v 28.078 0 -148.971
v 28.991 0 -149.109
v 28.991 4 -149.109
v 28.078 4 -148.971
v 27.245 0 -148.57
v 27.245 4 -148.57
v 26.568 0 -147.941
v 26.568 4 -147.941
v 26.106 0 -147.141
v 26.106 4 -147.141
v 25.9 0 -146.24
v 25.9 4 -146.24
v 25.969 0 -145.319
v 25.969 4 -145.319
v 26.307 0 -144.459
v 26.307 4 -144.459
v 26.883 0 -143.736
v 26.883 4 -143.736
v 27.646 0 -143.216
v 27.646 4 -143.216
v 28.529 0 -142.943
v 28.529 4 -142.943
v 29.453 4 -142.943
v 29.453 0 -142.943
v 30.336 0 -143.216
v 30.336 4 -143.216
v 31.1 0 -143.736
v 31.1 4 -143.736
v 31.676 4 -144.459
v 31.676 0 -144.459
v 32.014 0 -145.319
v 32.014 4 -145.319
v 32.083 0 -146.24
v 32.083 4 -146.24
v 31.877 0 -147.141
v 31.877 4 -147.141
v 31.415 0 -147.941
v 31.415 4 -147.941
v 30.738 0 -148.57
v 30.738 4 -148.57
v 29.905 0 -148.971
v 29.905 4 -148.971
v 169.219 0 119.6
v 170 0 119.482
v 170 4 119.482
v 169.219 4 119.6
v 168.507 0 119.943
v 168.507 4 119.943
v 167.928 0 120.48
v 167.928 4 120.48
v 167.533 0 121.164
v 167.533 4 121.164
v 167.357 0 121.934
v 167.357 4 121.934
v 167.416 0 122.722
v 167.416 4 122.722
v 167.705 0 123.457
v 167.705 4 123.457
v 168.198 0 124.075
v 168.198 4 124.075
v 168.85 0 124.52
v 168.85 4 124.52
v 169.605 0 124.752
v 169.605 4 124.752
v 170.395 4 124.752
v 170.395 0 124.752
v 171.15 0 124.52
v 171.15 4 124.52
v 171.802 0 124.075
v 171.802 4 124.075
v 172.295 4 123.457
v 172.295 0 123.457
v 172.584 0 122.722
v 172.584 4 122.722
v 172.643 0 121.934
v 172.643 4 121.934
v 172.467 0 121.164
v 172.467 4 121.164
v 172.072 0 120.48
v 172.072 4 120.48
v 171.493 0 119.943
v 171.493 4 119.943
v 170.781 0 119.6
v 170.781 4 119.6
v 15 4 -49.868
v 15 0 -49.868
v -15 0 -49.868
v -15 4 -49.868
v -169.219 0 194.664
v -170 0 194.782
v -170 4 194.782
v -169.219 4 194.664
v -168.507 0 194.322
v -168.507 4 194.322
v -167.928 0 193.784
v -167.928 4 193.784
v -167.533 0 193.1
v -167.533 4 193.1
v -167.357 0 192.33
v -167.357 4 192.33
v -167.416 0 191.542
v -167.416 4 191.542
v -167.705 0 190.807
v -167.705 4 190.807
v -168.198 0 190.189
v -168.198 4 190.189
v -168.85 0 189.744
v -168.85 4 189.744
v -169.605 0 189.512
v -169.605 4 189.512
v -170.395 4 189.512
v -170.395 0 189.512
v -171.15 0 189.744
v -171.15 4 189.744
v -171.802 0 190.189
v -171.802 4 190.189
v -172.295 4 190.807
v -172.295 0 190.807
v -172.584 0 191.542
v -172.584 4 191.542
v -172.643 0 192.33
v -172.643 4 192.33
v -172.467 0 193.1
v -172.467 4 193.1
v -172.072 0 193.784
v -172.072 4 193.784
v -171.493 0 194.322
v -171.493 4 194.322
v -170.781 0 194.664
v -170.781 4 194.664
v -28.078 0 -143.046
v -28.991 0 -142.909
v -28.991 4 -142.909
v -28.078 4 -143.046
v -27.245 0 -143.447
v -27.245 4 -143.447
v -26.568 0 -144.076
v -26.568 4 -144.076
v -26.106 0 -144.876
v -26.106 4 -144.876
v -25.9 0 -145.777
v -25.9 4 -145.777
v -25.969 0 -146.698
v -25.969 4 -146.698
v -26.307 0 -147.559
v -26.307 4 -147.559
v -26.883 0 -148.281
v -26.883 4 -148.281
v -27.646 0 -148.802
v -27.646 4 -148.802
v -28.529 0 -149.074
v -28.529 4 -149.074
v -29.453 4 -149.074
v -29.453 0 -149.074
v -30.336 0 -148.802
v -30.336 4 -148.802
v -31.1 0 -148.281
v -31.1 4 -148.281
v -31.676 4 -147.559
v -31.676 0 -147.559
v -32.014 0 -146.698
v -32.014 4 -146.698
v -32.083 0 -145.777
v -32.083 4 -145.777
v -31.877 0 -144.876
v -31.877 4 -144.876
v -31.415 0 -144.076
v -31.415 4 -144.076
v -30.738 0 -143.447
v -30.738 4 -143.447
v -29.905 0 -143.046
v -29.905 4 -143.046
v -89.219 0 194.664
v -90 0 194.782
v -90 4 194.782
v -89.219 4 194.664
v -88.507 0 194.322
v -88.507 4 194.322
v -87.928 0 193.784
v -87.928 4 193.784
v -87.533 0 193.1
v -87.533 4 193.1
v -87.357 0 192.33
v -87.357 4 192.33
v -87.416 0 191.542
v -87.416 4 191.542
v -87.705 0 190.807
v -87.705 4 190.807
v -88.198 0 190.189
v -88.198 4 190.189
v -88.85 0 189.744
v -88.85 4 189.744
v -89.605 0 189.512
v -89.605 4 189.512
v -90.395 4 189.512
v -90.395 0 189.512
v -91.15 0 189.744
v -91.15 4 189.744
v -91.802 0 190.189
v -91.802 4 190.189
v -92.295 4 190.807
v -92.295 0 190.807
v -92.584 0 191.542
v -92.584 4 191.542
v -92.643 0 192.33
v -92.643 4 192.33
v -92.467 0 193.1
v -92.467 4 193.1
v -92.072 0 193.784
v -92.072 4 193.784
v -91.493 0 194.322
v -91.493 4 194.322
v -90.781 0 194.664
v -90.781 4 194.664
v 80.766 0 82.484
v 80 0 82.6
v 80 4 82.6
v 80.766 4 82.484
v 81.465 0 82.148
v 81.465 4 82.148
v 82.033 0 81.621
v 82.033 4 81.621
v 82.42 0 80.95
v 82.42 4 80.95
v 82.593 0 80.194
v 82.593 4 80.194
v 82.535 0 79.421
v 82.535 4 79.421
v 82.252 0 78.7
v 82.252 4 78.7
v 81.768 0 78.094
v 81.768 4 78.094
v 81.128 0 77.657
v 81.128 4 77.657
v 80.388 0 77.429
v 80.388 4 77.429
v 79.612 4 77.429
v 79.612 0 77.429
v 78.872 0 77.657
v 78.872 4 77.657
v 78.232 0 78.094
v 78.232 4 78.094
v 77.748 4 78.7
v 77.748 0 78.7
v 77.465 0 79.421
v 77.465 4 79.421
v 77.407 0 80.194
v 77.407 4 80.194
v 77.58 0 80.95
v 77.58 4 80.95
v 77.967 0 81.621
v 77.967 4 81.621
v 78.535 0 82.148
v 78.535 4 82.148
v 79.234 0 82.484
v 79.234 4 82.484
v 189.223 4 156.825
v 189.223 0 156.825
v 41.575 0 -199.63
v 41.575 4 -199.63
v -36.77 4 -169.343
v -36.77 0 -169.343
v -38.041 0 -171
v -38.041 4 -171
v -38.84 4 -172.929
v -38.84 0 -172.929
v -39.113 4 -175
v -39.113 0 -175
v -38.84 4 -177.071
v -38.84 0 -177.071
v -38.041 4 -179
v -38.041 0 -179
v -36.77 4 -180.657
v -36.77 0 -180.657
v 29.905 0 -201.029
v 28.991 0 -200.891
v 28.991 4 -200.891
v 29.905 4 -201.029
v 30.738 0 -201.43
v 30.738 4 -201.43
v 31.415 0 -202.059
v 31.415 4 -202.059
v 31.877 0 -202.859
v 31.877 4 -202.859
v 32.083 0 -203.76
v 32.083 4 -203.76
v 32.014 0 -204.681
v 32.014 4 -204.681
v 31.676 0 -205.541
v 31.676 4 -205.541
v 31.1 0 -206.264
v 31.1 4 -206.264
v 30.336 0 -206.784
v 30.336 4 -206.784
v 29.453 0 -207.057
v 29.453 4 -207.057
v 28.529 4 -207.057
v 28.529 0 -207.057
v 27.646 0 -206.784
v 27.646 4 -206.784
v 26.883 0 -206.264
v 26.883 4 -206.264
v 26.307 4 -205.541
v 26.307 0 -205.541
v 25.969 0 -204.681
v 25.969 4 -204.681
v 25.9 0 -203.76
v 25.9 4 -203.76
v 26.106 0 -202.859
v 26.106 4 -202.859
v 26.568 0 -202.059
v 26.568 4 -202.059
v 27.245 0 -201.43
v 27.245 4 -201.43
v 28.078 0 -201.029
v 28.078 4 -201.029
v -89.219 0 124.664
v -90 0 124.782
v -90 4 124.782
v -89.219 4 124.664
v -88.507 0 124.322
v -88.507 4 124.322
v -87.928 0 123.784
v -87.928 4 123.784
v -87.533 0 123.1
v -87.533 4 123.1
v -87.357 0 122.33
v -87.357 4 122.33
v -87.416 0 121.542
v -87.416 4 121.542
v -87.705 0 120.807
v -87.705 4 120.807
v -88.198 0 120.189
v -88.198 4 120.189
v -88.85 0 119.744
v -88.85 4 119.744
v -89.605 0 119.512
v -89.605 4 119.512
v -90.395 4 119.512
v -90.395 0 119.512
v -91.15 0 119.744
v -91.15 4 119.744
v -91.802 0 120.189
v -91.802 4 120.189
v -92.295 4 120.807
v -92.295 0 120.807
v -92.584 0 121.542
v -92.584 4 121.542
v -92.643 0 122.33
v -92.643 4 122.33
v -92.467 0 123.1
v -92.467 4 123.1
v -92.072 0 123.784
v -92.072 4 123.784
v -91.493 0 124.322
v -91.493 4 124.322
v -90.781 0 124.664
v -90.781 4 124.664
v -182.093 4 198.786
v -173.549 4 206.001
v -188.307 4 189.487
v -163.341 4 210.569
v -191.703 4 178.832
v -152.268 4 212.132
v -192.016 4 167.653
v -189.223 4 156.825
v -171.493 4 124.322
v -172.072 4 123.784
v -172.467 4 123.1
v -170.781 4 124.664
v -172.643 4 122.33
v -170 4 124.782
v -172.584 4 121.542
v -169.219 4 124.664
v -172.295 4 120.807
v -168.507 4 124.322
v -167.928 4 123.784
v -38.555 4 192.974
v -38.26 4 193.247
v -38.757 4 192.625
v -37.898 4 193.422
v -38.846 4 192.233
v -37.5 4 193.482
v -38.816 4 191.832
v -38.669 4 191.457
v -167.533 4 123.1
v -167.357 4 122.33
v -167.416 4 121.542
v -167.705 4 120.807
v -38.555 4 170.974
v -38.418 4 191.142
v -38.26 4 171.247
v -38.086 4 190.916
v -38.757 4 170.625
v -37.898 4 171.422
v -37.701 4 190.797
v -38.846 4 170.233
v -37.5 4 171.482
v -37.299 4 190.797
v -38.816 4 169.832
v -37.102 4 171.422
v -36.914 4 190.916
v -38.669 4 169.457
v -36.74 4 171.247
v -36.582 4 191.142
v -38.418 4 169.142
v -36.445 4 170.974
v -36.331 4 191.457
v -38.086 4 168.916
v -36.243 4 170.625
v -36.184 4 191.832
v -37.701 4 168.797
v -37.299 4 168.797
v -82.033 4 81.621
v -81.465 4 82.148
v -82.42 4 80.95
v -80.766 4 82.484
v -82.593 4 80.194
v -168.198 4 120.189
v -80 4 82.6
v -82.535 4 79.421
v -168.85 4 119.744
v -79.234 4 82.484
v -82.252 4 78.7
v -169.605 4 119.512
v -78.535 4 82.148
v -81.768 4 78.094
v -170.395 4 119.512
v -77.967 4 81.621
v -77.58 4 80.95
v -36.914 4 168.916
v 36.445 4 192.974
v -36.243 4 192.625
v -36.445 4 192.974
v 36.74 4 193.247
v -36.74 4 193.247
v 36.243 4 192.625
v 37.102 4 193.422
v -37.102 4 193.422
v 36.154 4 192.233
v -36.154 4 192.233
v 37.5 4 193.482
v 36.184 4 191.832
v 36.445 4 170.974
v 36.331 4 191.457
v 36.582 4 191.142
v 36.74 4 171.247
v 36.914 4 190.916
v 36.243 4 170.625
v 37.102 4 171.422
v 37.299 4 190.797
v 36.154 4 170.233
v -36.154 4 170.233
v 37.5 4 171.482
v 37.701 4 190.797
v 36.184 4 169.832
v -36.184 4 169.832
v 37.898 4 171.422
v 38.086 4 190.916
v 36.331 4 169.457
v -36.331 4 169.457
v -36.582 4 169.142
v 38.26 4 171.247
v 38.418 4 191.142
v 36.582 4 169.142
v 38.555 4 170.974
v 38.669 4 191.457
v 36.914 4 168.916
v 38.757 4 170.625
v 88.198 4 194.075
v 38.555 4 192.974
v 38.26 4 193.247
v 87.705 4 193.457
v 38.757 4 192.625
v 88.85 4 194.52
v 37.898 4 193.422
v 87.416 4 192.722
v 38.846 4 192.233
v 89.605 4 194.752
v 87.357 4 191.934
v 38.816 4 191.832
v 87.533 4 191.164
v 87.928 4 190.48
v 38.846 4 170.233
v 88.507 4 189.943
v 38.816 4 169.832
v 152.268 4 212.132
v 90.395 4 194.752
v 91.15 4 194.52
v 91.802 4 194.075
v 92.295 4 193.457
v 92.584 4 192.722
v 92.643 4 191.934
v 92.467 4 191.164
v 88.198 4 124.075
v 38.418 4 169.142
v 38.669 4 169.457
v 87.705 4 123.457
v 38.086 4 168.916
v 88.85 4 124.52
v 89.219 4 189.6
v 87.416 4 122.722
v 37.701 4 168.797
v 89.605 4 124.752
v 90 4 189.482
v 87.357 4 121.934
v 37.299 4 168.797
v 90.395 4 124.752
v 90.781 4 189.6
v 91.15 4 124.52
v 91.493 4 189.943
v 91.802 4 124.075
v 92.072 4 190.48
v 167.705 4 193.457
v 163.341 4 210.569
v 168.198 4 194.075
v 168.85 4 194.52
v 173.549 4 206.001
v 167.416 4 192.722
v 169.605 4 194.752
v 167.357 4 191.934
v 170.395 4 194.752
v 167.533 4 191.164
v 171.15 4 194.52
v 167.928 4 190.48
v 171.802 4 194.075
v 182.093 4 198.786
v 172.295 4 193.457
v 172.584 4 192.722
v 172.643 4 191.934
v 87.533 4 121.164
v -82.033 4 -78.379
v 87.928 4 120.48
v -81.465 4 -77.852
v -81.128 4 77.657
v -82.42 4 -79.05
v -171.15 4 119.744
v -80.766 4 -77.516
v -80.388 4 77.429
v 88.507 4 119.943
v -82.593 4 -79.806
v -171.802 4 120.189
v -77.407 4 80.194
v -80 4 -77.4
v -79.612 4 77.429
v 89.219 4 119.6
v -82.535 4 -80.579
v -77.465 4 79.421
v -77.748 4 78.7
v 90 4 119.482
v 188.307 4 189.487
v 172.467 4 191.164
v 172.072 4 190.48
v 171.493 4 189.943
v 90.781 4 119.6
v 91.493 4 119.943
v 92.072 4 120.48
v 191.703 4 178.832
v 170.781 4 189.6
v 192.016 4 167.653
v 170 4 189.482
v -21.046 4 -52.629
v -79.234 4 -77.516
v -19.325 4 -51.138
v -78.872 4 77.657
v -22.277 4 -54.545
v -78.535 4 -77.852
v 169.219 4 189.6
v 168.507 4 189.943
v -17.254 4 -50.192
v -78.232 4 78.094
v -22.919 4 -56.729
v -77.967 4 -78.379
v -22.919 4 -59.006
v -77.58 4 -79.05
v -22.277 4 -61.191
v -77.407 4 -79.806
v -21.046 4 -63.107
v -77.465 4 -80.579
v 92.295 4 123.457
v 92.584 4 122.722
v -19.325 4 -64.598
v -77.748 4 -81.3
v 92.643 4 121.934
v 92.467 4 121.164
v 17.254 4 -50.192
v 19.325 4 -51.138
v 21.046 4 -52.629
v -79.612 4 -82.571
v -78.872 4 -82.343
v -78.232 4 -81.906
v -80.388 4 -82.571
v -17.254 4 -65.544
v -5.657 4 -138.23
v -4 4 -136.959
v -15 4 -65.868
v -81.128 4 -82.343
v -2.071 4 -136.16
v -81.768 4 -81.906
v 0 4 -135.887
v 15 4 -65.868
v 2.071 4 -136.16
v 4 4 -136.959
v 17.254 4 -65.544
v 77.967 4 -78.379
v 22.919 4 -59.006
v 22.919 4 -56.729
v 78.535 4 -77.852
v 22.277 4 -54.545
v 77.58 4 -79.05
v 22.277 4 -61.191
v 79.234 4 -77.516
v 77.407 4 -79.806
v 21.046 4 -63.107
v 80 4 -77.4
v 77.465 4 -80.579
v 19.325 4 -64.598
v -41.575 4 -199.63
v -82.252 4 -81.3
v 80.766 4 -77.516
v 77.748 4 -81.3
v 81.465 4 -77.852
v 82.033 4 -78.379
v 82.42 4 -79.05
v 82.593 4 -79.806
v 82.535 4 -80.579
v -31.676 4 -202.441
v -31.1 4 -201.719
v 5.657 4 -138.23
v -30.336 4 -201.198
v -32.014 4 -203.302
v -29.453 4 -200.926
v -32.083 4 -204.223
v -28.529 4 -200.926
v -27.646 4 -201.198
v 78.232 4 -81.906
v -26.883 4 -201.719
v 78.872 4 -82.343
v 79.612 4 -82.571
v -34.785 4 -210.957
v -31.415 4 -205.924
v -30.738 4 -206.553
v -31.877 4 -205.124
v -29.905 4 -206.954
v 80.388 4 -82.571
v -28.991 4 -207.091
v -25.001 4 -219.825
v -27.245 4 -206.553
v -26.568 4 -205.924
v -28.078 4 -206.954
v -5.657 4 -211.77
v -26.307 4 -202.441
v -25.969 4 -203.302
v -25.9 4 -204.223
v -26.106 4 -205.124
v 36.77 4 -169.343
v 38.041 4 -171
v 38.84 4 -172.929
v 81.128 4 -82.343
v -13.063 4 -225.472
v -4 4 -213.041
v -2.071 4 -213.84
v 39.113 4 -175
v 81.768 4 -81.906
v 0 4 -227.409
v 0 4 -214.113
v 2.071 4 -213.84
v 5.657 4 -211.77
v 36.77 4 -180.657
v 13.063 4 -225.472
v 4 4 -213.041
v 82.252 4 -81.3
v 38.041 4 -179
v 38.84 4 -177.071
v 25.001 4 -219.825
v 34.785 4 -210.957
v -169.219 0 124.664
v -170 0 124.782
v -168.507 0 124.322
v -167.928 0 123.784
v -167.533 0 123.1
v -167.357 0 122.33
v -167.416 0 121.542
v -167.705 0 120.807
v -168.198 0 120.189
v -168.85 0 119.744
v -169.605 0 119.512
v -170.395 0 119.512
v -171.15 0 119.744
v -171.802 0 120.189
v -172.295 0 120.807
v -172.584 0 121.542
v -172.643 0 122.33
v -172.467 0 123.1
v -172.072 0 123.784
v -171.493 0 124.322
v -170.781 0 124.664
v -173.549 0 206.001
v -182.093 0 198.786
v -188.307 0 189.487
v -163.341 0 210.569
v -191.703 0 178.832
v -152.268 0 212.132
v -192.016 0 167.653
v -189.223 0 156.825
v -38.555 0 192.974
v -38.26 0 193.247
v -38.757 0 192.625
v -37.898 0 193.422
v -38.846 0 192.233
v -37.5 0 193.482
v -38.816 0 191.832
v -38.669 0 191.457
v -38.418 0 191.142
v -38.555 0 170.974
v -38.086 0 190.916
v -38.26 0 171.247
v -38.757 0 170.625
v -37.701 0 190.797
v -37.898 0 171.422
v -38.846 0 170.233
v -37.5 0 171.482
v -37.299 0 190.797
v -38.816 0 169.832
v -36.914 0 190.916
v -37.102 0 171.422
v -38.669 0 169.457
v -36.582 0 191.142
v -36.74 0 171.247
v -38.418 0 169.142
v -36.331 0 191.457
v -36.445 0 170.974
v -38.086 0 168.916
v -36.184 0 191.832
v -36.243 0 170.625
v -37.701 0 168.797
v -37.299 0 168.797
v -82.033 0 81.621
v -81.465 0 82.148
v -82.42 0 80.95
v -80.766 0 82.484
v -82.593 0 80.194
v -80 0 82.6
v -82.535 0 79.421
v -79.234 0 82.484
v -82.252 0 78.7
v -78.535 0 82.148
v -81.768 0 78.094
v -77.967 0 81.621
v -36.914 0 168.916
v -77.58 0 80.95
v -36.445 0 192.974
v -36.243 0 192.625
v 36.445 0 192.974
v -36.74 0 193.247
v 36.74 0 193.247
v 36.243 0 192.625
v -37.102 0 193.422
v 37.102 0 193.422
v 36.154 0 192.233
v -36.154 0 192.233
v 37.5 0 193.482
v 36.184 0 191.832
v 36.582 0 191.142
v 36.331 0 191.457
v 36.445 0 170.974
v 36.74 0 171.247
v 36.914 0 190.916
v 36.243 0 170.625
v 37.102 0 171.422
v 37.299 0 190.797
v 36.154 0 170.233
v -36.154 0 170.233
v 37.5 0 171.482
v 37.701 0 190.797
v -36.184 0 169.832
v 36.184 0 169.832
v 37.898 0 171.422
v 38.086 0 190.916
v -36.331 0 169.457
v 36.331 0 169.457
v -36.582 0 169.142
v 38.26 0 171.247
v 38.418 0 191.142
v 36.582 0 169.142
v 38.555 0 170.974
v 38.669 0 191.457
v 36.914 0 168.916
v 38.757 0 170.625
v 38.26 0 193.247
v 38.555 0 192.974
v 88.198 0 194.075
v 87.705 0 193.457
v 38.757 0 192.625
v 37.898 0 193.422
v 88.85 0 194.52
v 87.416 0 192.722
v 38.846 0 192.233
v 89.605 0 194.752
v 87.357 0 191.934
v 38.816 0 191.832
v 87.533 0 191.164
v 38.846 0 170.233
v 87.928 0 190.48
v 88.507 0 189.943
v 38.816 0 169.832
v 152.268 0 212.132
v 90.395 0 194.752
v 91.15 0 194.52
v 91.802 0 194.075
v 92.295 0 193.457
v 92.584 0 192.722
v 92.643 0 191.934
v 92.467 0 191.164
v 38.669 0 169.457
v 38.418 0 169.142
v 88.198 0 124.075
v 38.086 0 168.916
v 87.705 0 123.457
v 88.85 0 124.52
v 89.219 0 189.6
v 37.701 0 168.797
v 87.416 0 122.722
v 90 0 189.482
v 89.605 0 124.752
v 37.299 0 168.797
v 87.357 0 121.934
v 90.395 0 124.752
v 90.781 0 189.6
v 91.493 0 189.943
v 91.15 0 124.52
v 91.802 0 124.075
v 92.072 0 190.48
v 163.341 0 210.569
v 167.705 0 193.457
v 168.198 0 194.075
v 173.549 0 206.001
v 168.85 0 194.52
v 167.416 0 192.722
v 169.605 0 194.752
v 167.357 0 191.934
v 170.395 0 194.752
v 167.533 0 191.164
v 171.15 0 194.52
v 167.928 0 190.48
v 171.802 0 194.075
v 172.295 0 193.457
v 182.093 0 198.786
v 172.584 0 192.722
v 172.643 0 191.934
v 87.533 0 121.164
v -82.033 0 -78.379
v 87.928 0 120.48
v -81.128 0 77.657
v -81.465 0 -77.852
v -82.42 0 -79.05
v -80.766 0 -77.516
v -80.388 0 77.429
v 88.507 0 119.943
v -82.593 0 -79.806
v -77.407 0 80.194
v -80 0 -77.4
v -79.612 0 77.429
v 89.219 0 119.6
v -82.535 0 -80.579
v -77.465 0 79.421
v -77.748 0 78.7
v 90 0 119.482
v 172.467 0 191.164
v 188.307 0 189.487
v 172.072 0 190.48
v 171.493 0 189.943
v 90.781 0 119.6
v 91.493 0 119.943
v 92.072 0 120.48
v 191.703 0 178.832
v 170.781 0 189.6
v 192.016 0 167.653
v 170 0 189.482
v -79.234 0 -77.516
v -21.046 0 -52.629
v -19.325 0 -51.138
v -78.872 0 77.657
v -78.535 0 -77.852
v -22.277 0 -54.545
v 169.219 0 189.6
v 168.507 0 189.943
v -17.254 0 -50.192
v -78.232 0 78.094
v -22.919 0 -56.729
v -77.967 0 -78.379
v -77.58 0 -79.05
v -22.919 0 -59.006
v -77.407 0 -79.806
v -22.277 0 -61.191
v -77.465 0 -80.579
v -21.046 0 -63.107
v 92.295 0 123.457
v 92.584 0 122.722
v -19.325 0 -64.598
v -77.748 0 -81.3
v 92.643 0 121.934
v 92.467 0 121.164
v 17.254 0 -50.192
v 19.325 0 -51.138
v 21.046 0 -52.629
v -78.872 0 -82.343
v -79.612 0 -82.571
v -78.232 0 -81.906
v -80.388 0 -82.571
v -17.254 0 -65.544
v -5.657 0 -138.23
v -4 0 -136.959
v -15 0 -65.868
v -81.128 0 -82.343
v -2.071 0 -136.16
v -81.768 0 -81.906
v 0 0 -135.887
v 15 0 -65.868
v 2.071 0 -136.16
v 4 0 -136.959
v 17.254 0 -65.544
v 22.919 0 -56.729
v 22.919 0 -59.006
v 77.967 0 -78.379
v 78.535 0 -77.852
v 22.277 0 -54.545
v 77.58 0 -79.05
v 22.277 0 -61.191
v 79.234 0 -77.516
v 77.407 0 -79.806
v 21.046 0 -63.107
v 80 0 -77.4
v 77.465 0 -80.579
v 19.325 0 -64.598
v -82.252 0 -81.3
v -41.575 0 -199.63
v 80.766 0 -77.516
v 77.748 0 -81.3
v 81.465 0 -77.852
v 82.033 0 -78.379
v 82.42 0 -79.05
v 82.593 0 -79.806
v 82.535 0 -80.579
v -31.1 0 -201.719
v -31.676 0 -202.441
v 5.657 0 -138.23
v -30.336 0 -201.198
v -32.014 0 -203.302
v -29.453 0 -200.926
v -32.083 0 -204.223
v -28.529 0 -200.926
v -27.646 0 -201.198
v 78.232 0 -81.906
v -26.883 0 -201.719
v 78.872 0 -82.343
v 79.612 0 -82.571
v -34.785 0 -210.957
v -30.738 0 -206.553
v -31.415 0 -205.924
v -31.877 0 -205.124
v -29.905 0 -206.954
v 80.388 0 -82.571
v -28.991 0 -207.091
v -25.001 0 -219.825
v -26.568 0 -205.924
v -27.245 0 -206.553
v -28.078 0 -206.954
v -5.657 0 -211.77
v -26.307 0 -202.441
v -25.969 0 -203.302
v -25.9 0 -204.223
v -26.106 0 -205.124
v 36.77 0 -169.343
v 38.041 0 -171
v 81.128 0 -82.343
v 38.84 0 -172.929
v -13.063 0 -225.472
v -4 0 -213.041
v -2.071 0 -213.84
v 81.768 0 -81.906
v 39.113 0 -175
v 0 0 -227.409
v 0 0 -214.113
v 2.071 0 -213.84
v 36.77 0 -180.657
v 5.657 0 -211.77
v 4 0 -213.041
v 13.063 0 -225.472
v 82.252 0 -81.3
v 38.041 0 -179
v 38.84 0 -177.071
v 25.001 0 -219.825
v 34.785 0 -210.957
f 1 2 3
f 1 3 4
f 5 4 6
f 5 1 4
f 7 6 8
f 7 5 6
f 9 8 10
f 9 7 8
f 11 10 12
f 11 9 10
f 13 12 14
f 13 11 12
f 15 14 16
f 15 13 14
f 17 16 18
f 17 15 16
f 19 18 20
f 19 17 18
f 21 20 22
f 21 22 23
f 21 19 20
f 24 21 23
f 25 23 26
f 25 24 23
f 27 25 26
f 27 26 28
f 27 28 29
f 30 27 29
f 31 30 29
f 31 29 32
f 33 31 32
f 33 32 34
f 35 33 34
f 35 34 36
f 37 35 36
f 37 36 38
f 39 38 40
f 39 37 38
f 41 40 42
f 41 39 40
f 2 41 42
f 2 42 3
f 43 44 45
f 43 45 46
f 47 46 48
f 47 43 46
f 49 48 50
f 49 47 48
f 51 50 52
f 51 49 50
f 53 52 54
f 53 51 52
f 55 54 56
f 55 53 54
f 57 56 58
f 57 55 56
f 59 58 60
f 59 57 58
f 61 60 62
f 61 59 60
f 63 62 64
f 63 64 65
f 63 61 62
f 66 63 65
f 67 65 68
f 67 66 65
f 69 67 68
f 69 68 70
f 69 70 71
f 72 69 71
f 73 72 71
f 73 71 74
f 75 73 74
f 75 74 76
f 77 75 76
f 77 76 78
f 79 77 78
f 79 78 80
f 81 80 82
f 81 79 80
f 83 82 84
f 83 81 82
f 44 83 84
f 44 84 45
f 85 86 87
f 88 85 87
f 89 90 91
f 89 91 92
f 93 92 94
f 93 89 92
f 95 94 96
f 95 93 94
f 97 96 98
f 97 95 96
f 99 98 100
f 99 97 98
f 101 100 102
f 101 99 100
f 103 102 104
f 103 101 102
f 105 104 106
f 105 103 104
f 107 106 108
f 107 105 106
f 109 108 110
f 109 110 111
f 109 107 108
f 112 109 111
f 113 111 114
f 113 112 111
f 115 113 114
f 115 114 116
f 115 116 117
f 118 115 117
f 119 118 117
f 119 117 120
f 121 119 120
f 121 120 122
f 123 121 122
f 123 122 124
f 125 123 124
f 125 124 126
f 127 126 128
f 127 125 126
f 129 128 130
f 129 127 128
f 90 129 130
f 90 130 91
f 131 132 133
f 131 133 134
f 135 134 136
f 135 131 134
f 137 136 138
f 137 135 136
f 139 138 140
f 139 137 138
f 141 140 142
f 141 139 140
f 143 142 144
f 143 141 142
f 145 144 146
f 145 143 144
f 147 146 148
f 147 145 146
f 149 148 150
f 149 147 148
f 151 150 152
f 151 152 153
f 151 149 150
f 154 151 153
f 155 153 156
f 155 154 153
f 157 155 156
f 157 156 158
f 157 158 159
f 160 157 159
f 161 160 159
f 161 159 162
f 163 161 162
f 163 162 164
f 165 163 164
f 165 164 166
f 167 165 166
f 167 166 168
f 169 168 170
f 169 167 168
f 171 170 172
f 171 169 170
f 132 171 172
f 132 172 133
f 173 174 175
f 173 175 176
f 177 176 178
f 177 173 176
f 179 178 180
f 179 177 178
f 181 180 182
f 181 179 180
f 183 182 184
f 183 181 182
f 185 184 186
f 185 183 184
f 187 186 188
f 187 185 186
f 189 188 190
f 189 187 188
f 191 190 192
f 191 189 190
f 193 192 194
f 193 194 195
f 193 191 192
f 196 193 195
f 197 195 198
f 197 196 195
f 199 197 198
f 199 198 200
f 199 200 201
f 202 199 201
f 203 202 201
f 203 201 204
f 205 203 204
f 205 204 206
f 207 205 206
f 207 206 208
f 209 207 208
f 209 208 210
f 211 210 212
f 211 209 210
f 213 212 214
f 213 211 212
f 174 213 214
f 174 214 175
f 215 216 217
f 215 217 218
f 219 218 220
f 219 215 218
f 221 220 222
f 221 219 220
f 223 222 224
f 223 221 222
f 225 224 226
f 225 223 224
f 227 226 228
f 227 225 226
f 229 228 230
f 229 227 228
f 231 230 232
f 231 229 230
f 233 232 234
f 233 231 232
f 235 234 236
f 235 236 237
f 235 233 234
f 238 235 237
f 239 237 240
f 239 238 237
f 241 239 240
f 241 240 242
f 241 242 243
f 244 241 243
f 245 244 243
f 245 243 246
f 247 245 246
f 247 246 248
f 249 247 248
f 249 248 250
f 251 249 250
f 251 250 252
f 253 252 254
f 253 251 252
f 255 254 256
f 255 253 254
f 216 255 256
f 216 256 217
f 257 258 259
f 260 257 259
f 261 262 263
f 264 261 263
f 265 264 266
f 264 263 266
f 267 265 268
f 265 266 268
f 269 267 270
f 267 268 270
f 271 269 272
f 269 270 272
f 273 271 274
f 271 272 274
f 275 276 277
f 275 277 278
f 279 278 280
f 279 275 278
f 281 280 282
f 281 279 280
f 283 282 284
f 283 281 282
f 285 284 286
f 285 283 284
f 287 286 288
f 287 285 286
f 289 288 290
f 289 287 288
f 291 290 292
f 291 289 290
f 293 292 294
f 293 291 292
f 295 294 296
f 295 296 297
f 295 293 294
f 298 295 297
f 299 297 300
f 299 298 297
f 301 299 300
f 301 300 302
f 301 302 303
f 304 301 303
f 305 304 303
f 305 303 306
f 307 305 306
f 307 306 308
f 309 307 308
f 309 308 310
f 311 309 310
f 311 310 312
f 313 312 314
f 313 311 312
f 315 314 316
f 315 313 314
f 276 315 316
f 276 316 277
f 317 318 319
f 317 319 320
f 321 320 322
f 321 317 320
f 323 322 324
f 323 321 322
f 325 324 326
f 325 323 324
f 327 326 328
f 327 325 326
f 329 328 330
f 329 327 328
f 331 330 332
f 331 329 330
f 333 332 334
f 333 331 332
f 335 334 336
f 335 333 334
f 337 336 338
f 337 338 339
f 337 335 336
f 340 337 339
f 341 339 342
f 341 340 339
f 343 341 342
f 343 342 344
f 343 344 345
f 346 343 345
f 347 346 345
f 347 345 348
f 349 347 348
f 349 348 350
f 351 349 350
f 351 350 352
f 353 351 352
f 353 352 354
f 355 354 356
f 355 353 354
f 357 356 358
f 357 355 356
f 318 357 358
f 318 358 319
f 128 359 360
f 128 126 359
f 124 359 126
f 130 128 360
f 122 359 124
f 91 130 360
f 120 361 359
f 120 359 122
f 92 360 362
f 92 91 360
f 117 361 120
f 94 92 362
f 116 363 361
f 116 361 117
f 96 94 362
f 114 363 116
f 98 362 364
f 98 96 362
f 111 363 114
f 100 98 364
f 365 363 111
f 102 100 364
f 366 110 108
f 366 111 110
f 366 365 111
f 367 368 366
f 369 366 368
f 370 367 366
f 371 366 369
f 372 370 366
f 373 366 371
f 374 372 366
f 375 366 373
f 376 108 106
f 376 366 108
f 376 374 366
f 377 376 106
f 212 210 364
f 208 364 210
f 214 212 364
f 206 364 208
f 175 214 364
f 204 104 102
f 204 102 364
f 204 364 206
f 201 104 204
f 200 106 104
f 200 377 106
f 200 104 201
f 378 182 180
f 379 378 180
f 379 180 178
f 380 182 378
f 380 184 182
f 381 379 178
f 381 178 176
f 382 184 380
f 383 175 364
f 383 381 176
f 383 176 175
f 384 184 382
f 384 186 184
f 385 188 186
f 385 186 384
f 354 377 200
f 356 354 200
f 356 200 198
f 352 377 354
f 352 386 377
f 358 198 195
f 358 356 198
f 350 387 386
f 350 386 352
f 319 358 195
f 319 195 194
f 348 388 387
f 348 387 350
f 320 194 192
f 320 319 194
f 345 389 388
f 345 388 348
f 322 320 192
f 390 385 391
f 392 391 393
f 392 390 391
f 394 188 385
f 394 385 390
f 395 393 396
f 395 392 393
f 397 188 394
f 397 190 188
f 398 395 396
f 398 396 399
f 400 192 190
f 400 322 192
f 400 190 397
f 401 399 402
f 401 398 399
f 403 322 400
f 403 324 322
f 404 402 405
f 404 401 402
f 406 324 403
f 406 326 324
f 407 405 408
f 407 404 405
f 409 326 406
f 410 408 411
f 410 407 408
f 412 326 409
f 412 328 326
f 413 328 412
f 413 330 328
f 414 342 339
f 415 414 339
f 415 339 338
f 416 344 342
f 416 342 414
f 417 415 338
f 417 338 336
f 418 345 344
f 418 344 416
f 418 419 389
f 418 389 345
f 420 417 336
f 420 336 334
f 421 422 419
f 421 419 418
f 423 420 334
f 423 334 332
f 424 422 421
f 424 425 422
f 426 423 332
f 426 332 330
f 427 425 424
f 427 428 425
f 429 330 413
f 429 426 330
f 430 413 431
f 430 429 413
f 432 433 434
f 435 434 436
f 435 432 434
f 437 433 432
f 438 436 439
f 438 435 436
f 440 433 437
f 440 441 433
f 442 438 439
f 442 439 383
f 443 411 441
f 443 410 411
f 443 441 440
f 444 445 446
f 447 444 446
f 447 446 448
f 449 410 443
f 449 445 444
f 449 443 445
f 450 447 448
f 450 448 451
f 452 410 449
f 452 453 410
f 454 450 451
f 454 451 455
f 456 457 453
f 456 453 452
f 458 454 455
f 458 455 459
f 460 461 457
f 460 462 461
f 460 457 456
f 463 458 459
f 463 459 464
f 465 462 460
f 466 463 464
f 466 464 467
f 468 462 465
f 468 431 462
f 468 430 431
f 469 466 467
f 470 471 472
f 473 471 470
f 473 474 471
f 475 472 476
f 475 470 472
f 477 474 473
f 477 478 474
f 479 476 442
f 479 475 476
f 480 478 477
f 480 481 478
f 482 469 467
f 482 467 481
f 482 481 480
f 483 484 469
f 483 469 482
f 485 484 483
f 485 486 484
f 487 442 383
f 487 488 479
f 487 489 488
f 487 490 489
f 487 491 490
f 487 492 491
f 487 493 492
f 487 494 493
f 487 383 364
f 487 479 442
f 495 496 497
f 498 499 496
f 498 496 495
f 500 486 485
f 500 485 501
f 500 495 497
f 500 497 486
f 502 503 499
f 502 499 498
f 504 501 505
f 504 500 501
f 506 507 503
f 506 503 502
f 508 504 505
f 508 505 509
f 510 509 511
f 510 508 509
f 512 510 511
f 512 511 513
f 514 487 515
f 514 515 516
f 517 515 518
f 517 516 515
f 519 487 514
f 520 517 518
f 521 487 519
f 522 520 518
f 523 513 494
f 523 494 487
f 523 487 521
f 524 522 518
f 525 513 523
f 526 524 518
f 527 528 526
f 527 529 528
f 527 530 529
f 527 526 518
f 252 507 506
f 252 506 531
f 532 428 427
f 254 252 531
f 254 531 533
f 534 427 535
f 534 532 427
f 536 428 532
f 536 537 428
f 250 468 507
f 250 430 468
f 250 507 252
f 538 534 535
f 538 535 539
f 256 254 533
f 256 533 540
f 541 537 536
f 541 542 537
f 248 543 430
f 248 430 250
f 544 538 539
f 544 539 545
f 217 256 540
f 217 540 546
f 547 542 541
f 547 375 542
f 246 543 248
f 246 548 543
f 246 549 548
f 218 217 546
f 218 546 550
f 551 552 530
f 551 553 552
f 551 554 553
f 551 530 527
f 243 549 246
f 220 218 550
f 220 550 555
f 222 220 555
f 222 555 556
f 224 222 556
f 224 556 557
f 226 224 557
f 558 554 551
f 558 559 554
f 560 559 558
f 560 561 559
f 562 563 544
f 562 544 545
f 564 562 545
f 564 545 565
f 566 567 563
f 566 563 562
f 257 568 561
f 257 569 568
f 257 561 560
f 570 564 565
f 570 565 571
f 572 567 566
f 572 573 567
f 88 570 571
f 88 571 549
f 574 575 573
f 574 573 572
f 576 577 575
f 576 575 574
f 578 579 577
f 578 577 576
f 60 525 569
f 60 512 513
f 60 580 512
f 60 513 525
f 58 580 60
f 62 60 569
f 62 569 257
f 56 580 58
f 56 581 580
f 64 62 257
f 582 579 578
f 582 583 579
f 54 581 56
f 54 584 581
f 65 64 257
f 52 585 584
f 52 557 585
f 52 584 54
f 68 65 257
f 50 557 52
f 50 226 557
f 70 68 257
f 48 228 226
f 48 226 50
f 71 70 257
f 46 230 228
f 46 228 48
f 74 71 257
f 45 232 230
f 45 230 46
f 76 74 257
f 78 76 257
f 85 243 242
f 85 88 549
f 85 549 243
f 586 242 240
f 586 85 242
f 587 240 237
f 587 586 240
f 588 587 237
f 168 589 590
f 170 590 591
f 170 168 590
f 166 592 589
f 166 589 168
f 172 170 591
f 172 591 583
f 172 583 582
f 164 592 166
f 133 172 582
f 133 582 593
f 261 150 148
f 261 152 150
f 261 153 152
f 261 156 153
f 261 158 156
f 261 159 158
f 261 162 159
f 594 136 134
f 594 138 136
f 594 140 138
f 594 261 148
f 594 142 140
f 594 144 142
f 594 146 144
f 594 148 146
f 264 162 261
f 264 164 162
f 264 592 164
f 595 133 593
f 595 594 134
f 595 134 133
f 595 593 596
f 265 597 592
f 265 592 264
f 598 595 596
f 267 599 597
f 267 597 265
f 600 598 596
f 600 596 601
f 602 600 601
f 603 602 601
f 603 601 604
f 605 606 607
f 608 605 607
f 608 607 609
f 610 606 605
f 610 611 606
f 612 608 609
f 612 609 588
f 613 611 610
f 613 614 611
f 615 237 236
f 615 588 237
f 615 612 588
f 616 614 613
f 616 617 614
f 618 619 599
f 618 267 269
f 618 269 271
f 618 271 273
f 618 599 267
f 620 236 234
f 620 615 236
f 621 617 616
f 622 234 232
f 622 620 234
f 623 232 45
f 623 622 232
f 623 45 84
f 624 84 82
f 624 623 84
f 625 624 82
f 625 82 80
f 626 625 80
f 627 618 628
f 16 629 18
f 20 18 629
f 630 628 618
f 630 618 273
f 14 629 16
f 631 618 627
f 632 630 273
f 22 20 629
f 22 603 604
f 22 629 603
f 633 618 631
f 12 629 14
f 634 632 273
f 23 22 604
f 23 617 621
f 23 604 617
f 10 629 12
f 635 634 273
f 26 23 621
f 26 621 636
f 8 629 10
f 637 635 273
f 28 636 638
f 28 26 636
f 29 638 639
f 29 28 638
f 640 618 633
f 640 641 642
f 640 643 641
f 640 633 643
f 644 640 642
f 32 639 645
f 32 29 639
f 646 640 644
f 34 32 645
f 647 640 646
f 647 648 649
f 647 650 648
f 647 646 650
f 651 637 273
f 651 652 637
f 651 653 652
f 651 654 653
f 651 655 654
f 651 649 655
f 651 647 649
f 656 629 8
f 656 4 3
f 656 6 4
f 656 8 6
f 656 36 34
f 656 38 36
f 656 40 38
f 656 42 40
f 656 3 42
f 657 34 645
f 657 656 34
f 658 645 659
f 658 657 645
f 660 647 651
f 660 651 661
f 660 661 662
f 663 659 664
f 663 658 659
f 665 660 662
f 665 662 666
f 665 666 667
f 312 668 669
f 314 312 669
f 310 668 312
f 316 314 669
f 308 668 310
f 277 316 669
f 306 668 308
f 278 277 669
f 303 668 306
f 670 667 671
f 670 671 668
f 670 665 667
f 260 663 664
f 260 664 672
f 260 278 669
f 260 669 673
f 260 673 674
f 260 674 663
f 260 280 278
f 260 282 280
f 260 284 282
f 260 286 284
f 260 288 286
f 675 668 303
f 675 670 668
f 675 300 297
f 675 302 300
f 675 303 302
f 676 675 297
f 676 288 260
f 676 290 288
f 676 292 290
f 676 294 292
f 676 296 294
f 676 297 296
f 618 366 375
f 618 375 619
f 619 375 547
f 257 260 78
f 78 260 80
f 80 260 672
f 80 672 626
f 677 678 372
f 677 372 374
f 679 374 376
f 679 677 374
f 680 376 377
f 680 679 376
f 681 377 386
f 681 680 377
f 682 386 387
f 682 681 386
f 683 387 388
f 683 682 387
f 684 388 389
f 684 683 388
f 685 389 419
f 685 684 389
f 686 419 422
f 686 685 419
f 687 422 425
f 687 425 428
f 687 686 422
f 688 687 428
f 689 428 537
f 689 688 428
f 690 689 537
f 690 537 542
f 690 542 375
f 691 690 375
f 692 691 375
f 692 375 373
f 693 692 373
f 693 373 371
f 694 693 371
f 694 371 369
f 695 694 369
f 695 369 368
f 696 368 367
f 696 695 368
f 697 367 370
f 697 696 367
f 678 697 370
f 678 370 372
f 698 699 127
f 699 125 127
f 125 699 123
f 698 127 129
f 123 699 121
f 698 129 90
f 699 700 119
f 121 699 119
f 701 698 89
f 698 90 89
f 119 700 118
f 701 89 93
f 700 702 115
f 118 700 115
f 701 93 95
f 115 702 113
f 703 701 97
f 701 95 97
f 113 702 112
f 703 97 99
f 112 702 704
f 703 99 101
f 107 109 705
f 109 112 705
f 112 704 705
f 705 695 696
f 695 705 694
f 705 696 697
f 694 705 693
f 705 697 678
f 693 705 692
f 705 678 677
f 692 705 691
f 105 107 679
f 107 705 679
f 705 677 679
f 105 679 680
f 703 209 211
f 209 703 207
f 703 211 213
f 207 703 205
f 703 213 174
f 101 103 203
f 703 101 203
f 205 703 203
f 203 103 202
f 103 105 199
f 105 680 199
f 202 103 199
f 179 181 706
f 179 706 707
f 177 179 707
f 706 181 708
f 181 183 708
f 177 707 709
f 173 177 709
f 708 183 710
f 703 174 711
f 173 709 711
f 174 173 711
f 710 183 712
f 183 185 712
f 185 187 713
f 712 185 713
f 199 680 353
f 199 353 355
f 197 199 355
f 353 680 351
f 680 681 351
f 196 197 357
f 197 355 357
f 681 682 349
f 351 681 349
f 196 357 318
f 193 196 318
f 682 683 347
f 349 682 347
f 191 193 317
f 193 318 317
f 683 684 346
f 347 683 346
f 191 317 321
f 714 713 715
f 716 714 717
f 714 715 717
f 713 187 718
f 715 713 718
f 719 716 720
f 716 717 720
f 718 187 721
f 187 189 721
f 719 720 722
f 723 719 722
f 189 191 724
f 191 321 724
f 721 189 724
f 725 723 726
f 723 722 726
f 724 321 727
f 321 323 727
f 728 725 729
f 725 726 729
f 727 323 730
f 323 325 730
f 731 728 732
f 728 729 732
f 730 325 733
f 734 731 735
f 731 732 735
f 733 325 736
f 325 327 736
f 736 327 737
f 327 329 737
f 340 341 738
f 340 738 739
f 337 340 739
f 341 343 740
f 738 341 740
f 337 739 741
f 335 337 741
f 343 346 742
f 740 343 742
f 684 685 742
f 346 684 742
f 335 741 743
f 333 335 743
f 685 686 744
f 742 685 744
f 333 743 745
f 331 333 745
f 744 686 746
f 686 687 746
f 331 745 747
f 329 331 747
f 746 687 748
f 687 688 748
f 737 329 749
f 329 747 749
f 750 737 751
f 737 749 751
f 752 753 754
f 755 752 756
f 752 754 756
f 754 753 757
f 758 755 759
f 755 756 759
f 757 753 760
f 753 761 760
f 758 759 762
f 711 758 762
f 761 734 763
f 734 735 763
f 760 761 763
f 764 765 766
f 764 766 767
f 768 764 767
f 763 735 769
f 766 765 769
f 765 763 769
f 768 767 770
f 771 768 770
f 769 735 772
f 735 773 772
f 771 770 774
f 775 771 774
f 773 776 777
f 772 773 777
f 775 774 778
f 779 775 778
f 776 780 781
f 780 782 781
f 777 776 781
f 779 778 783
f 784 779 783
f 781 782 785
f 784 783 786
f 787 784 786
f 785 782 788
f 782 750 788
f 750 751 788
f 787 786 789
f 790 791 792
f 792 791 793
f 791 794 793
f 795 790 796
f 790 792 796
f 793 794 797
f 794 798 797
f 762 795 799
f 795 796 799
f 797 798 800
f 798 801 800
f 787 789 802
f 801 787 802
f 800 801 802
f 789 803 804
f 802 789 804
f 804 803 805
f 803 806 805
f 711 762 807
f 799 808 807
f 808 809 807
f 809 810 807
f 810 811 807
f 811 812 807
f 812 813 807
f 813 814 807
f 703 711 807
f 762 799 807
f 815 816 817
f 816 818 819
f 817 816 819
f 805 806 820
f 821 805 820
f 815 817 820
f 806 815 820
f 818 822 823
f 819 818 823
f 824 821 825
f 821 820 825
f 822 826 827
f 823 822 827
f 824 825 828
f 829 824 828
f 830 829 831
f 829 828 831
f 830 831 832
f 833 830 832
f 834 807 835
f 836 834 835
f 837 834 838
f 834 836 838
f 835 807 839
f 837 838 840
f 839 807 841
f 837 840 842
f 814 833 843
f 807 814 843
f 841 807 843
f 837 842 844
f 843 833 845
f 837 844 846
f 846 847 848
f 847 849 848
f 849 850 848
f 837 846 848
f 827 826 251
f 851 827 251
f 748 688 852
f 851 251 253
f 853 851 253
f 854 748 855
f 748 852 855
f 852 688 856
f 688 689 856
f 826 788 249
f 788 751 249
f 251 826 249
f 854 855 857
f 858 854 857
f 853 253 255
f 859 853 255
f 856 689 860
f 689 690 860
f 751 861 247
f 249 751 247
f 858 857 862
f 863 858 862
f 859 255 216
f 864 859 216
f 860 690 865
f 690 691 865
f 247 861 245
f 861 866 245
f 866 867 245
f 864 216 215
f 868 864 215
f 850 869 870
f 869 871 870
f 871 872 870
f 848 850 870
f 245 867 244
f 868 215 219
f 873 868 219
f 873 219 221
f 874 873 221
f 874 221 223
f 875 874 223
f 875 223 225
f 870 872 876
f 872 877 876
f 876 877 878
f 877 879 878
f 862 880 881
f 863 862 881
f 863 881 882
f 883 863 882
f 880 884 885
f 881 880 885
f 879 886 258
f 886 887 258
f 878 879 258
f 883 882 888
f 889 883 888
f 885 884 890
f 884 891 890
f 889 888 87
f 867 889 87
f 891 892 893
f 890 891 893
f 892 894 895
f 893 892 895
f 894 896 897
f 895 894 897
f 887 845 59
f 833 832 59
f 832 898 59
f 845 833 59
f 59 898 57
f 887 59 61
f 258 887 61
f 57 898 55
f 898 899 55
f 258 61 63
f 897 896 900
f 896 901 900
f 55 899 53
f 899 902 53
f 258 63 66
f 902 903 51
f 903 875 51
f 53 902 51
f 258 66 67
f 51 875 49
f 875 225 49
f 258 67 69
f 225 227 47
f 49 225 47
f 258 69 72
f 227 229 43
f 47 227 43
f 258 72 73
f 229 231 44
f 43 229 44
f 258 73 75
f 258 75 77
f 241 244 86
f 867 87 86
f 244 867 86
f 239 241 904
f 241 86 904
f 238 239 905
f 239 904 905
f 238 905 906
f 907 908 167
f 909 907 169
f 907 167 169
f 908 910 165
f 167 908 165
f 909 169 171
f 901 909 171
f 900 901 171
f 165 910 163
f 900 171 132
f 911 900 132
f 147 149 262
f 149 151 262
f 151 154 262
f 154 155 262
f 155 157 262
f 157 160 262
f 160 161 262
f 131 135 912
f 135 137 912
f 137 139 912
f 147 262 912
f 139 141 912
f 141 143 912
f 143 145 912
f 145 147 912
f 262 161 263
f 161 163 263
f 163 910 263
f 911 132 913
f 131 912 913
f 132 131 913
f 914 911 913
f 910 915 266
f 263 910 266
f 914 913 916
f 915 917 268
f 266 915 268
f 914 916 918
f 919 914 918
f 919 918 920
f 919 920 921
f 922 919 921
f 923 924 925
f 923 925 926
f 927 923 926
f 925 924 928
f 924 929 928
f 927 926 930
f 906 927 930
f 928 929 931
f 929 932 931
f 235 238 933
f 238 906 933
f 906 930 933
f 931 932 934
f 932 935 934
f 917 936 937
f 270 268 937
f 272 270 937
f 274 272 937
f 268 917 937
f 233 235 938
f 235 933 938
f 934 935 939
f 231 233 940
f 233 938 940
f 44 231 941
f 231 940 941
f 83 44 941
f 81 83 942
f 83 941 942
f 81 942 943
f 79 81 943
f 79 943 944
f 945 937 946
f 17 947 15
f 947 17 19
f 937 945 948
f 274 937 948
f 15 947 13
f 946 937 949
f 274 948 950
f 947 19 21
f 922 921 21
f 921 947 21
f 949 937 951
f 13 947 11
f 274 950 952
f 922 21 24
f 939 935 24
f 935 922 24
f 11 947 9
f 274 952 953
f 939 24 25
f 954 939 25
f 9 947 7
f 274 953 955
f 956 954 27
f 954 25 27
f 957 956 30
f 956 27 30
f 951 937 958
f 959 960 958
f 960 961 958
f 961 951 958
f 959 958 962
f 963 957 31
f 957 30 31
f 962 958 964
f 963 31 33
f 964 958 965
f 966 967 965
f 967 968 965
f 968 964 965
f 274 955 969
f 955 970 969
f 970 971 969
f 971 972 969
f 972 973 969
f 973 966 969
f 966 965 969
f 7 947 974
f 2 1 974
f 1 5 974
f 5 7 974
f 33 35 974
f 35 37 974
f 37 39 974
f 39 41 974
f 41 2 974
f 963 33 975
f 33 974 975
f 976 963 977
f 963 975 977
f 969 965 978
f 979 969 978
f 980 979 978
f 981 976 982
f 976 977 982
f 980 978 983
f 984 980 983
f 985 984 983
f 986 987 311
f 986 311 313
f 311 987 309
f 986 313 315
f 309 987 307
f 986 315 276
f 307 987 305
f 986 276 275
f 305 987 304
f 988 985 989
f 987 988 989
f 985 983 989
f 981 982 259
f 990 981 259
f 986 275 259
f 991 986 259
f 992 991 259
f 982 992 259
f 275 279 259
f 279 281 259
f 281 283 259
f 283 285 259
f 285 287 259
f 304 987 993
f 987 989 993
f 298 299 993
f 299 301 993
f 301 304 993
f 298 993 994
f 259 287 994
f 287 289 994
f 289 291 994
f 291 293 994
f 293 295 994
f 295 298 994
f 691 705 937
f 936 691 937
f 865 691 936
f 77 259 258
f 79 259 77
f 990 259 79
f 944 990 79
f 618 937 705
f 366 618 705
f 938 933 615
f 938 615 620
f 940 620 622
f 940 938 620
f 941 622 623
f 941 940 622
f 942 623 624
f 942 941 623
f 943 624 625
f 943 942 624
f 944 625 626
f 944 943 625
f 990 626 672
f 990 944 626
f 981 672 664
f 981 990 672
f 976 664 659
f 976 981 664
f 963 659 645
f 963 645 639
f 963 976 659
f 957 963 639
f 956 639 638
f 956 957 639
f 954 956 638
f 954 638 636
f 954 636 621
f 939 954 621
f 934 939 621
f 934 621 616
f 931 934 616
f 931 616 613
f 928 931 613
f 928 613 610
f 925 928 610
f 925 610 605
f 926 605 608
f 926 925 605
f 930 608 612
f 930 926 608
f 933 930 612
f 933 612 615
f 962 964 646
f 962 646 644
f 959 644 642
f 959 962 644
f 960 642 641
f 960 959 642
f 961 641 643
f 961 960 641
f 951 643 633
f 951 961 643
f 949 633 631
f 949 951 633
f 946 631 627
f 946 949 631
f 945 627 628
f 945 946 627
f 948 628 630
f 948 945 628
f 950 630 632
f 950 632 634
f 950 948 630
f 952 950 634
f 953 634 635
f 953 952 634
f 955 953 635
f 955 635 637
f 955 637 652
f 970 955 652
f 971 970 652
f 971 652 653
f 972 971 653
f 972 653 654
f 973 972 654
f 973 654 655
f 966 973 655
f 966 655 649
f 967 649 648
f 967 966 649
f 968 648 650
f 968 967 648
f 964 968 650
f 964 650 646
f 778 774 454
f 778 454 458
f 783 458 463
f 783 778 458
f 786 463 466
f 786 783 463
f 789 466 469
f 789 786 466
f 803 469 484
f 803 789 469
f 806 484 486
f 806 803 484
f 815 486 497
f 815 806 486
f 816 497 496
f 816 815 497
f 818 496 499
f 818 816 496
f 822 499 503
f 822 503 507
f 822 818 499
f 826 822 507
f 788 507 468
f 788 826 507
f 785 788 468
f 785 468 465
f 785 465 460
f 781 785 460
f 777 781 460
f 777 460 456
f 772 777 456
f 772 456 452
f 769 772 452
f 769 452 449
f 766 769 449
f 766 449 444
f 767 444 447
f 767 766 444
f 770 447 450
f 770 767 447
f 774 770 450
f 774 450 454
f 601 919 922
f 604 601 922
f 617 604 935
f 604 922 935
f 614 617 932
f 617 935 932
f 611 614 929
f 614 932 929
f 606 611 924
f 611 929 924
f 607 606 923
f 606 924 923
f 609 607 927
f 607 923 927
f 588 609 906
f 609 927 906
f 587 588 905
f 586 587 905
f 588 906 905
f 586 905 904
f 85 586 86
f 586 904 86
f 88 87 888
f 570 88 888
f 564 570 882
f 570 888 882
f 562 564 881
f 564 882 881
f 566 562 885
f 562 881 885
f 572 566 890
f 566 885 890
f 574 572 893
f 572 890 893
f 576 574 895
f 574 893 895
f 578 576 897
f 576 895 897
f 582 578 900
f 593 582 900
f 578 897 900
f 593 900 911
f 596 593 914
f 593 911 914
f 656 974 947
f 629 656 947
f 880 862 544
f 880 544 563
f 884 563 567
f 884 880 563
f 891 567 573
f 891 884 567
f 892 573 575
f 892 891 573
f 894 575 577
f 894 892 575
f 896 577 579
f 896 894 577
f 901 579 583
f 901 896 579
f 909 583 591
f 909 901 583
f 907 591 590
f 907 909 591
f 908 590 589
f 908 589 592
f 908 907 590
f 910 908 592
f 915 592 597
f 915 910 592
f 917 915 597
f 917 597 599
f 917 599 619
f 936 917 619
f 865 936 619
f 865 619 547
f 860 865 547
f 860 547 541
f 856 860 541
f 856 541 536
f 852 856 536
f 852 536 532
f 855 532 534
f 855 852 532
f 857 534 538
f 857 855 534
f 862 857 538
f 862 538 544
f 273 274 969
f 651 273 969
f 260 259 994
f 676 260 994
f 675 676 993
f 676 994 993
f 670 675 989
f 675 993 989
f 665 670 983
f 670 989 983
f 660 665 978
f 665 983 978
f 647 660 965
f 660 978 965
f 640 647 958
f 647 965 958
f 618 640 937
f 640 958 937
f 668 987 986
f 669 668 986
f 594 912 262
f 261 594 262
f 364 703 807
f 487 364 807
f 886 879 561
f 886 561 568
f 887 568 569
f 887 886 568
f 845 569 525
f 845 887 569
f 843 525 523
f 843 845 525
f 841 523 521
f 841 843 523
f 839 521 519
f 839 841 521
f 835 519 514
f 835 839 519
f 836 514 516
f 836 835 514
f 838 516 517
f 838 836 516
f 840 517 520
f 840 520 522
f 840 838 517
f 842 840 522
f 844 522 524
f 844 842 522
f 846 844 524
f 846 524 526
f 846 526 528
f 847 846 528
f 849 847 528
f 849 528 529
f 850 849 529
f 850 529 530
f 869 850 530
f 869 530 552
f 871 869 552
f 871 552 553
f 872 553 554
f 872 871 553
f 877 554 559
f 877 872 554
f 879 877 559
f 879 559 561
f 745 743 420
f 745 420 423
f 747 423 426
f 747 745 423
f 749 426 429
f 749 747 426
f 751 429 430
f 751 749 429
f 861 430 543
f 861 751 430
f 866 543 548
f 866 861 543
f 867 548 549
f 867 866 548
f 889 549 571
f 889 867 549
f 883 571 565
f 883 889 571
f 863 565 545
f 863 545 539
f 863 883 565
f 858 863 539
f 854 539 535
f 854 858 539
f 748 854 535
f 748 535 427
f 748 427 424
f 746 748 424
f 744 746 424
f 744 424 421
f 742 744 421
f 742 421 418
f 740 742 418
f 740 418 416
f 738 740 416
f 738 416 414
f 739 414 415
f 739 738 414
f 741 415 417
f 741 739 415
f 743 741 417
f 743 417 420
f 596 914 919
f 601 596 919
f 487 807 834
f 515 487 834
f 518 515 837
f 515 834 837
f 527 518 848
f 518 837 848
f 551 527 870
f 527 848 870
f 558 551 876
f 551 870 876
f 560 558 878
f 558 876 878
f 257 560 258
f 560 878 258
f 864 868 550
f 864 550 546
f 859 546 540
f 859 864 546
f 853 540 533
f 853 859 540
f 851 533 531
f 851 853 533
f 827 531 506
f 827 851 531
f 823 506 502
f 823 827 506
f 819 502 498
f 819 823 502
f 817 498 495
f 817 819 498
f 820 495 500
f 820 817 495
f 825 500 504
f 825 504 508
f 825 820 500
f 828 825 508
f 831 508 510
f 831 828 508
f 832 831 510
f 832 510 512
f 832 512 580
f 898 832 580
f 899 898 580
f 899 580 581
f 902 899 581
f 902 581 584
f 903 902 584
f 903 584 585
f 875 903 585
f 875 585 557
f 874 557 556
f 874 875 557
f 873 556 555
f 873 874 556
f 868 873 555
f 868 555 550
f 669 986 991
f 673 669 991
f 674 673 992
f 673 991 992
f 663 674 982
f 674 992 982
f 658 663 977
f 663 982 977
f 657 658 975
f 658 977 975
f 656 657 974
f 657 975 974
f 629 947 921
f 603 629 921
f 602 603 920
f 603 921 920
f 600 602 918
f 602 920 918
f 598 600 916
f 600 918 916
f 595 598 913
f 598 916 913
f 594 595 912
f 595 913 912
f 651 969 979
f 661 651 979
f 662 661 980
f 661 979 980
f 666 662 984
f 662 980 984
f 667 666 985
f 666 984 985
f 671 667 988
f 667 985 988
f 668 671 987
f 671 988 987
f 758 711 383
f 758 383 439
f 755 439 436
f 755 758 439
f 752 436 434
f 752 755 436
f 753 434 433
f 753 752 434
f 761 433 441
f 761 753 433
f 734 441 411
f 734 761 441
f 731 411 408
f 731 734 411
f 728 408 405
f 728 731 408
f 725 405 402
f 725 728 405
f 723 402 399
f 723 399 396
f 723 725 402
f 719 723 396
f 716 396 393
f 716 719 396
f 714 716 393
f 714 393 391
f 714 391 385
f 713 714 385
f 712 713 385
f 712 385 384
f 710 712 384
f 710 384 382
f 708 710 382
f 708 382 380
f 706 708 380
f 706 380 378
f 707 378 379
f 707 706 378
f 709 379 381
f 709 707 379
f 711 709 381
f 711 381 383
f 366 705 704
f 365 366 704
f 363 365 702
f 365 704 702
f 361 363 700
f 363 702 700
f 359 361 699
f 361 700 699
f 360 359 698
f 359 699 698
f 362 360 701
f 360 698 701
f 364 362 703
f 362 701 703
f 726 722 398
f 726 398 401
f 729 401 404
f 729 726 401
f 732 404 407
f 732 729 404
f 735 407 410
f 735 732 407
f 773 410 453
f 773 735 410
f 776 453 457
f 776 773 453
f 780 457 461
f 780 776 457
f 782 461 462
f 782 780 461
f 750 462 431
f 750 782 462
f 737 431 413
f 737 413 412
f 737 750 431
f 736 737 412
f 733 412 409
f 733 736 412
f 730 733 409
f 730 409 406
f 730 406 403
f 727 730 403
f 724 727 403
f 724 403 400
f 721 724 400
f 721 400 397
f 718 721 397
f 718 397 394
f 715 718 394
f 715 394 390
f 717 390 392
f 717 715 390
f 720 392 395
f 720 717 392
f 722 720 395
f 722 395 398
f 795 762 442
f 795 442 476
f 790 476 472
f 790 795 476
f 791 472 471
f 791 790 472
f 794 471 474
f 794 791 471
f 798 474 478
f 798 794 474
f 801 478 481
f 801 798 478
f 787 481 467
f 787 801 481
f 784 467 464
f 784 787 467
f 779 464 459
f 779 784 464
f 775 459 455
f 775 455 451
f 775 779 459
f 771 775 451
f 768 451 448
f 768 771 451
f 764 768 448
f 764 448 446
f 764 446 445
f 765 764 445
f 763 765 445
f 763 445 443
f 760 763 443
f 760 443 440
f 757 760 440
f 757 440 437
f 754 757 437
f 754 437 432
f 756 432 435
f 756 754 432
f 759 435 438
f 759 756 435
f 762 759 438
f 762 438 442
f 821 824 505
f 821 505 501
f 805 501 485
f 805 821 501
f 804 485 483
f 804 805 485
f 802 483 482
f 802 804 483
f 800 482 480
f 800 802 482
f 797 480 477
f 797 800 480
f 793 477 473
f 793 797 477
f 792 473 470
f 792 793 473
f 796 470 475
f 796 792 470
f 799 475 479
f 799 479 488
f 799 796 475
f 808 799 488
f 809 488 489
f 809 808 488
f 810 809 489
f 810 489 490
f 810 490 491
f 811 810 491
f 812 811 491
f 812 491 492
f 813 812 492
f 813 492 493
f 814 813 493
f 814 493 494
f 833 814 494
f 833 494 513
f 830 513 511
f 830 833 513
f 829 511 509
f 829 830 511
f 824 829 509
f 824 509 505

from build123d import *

# Parameters (mm, degrees)
SKETCH_2_R      = 3.1
SKETCH_2_R_2    = 2.65
SKETCH_2_R_3    = 1.35
SKETCH_2_R_4    = 2.6
EXTRUDE_2_DEPTH = 4


with BuildPart() as part:
    # 草图2 → 凸台-拉伸2 (new body)
    with BuildSketch(Plane(origin=(0, 0, 0), x_dir=(1, 0, 0), z_dir=(0, 1, 0))):
        with BuildLine():
            Line((-41.574578963, 199.630087618), (-189.22298515, -156.824697061))
            ThreePointArc((-189.22298515, -156.824697061), (-185.526588341, -194.354843677), (-152.267803849, -212.132034356))
            Line((-152.267803849, -212.132034356), (152.267803849, -212.132034356))
            ThreePointArc((152.267803849, -212.132034356), (185.526588341, -194.354843677), (189.22298515, -156.824697061))
            Line((189.22298515, -156.824697061), (41.574578963, 199.630087618))
            ThreePointArc((41.574578963, 199.630087618), (0, 227.409333161), (-41.574578963, 199.630087618))
        make_face()
        with Locations(Location((28.991378029, 203.991378029, 0), (0, 0, 270))):
            Circle(SKETCH_2_R, mode=Mode.SUBTRACT)
        with Locations(Location((-28.991378029, 203.991378029, 0), (0, 0, 90))):
            Circle(SKETCH_2_R, mode=Mode.SUBTRACT)
        with Locations(Location((28.991378029, 146.008621971, 0), (0, 0, 90))):
            Circle(SKETCH_2_R, mode=Mode.SUBTRACT)
        with Locations(Location((-28.991378029, 146.008621971, 0), (0, 0, 270))):
            Circle(SKETCH_2_R, mode=Mode.SUBTRACT)
        with Locations(Location((-170, -122.132034356, 0), (0, 0, 270))):
            Circle(SKETCH_2_R_2, mode=Mode.SUBTRACT)
        with Locations(Location((-90, -122.132034356, 0), (0, 0, 270))):
            Circle(SKETCH_2_R_2, mode=Mode.SUBTRACT)
        with Locations(Location((-90, -192.132034356, 0), (0, 0, 270))):
            Circle(SKETCH_2_R_2, mode=Mode.SUBTRACT)
        with Locations(Location((-170, -192.132034356, 0), (0, 0, 270))):
            Circle(SKETCH_2_R_2, mode=Mode.SUBTRACT)
        with Locations(Location((90, -192.132034356, 0), (0, 0, 90))):
            Circle(SKETCH_2_R_2, mode=Mode.SUBTRACT)
        with Locations(Location((170, -192.132034356, 0), (0, 0, 90))):
            Circle(SKETCH_2_R_2, mode=Mode.SUBTRACT)
        with Locations(Location((90, -122.132034356, 0), (0, 0, 90))):
            Circle(SKETCH_2_R_2, mode=Mode.SUBTRACT)
        with Locations(Location((170, -122.132034356, 0), (0, 0, 90))):
            Circle(SKETCH_2_R_2, mode=Mode.SUBTRACT)
        with Locations(Location((37.5, -170.132034356, 0), (0, 0, 270))):
            Circle(SKETCH_2_R_3, mode=Mode.SUBTRACT)
        with Locations(Location((-37.5, -170.132034356, 0), (0, 0, 270))):
            Circle(SKETCH_2_R_3, mode=Mode.SUBTRACT)
        with Locations(Location((-37.5, -192.132034356, 0), (0, 0, 270))):
            Circle(SKETCH_2_R_3, mode=Mode.SUBTRACT)
        with Locations(Location((37.5, -192.132034356, 0), (0, 0, 270))):
            Circle(SKETCH_2_R_3, mode=Mode.SUBTRACT)
        with Locations(Location((-80, 80, 0), (0, 0, 270))):
            Circle(SKETCH_2_R_4, mode=Mode.SUBTRACT)
        with Locations(Location((80, 80, 0), (0, 0, 270))):
            Circle(SKETCH_2_R_4, mode=Mode.SUBTRACT)
        with Locations(Location((80, -80, 0), (0, 0, 270))):
            Circle(SKETCH_2_R_4, mode=Mode.SUBTRACT)
        with Locations(Location((-80, -80, 0), (0, 0, 270))):
            Circle(SKETCH_2_R_4, mode=Mode.SUBTRACT)
        with BuildLine():
            Line((-36.769552622, 180.656854249), (-5.656854249, 211.769552622))
            ThreePointArc((-5.656854249, 211.769552622), (0, 214.112698372), (5.656854249, 211.769552622))
            Line((5.656854249, 211.769552622), (36.769552622, 180.656854249))
            ThreePointArc((36.769552622, 180.656854249), (39.112698372, 175), (36.769552622, 169.343145751))
            Line((36.769552622, 169.343145751), (5.656854249, 138.230447378))
            ThreePointArc((5.656854249, 138.230447378), (0, 135.887301628), (-5.656854249, 138.230447378))
            Line((-5.656854249, 138.230447378), (-36.769552622, 169.343145751))
            ThreePointArc((-36.769552622, 169.343145751), (-39.112698372, 175), (-36.769552622, 180.656854249))
        make_face(mode=Mode.SUBTRACT)
        with BuildLine():
            Line((-15, 65.867965644), (15, 65.867965644))
            ThreePointArc((15, 65.867965644), (23, 57.867965644), (15, 49.867965644))
            Line((15, 49.867965644), (-15, 49.867965644))
            ThreePointArc((-15, 49.867965644), (-23, 57.867965644), (-15, 65.867965644))
        make_face(mode=Mode.SUBTRACT)
    extrude(amount=EXTRUDE_2_DEPTH)


solid = part.part
